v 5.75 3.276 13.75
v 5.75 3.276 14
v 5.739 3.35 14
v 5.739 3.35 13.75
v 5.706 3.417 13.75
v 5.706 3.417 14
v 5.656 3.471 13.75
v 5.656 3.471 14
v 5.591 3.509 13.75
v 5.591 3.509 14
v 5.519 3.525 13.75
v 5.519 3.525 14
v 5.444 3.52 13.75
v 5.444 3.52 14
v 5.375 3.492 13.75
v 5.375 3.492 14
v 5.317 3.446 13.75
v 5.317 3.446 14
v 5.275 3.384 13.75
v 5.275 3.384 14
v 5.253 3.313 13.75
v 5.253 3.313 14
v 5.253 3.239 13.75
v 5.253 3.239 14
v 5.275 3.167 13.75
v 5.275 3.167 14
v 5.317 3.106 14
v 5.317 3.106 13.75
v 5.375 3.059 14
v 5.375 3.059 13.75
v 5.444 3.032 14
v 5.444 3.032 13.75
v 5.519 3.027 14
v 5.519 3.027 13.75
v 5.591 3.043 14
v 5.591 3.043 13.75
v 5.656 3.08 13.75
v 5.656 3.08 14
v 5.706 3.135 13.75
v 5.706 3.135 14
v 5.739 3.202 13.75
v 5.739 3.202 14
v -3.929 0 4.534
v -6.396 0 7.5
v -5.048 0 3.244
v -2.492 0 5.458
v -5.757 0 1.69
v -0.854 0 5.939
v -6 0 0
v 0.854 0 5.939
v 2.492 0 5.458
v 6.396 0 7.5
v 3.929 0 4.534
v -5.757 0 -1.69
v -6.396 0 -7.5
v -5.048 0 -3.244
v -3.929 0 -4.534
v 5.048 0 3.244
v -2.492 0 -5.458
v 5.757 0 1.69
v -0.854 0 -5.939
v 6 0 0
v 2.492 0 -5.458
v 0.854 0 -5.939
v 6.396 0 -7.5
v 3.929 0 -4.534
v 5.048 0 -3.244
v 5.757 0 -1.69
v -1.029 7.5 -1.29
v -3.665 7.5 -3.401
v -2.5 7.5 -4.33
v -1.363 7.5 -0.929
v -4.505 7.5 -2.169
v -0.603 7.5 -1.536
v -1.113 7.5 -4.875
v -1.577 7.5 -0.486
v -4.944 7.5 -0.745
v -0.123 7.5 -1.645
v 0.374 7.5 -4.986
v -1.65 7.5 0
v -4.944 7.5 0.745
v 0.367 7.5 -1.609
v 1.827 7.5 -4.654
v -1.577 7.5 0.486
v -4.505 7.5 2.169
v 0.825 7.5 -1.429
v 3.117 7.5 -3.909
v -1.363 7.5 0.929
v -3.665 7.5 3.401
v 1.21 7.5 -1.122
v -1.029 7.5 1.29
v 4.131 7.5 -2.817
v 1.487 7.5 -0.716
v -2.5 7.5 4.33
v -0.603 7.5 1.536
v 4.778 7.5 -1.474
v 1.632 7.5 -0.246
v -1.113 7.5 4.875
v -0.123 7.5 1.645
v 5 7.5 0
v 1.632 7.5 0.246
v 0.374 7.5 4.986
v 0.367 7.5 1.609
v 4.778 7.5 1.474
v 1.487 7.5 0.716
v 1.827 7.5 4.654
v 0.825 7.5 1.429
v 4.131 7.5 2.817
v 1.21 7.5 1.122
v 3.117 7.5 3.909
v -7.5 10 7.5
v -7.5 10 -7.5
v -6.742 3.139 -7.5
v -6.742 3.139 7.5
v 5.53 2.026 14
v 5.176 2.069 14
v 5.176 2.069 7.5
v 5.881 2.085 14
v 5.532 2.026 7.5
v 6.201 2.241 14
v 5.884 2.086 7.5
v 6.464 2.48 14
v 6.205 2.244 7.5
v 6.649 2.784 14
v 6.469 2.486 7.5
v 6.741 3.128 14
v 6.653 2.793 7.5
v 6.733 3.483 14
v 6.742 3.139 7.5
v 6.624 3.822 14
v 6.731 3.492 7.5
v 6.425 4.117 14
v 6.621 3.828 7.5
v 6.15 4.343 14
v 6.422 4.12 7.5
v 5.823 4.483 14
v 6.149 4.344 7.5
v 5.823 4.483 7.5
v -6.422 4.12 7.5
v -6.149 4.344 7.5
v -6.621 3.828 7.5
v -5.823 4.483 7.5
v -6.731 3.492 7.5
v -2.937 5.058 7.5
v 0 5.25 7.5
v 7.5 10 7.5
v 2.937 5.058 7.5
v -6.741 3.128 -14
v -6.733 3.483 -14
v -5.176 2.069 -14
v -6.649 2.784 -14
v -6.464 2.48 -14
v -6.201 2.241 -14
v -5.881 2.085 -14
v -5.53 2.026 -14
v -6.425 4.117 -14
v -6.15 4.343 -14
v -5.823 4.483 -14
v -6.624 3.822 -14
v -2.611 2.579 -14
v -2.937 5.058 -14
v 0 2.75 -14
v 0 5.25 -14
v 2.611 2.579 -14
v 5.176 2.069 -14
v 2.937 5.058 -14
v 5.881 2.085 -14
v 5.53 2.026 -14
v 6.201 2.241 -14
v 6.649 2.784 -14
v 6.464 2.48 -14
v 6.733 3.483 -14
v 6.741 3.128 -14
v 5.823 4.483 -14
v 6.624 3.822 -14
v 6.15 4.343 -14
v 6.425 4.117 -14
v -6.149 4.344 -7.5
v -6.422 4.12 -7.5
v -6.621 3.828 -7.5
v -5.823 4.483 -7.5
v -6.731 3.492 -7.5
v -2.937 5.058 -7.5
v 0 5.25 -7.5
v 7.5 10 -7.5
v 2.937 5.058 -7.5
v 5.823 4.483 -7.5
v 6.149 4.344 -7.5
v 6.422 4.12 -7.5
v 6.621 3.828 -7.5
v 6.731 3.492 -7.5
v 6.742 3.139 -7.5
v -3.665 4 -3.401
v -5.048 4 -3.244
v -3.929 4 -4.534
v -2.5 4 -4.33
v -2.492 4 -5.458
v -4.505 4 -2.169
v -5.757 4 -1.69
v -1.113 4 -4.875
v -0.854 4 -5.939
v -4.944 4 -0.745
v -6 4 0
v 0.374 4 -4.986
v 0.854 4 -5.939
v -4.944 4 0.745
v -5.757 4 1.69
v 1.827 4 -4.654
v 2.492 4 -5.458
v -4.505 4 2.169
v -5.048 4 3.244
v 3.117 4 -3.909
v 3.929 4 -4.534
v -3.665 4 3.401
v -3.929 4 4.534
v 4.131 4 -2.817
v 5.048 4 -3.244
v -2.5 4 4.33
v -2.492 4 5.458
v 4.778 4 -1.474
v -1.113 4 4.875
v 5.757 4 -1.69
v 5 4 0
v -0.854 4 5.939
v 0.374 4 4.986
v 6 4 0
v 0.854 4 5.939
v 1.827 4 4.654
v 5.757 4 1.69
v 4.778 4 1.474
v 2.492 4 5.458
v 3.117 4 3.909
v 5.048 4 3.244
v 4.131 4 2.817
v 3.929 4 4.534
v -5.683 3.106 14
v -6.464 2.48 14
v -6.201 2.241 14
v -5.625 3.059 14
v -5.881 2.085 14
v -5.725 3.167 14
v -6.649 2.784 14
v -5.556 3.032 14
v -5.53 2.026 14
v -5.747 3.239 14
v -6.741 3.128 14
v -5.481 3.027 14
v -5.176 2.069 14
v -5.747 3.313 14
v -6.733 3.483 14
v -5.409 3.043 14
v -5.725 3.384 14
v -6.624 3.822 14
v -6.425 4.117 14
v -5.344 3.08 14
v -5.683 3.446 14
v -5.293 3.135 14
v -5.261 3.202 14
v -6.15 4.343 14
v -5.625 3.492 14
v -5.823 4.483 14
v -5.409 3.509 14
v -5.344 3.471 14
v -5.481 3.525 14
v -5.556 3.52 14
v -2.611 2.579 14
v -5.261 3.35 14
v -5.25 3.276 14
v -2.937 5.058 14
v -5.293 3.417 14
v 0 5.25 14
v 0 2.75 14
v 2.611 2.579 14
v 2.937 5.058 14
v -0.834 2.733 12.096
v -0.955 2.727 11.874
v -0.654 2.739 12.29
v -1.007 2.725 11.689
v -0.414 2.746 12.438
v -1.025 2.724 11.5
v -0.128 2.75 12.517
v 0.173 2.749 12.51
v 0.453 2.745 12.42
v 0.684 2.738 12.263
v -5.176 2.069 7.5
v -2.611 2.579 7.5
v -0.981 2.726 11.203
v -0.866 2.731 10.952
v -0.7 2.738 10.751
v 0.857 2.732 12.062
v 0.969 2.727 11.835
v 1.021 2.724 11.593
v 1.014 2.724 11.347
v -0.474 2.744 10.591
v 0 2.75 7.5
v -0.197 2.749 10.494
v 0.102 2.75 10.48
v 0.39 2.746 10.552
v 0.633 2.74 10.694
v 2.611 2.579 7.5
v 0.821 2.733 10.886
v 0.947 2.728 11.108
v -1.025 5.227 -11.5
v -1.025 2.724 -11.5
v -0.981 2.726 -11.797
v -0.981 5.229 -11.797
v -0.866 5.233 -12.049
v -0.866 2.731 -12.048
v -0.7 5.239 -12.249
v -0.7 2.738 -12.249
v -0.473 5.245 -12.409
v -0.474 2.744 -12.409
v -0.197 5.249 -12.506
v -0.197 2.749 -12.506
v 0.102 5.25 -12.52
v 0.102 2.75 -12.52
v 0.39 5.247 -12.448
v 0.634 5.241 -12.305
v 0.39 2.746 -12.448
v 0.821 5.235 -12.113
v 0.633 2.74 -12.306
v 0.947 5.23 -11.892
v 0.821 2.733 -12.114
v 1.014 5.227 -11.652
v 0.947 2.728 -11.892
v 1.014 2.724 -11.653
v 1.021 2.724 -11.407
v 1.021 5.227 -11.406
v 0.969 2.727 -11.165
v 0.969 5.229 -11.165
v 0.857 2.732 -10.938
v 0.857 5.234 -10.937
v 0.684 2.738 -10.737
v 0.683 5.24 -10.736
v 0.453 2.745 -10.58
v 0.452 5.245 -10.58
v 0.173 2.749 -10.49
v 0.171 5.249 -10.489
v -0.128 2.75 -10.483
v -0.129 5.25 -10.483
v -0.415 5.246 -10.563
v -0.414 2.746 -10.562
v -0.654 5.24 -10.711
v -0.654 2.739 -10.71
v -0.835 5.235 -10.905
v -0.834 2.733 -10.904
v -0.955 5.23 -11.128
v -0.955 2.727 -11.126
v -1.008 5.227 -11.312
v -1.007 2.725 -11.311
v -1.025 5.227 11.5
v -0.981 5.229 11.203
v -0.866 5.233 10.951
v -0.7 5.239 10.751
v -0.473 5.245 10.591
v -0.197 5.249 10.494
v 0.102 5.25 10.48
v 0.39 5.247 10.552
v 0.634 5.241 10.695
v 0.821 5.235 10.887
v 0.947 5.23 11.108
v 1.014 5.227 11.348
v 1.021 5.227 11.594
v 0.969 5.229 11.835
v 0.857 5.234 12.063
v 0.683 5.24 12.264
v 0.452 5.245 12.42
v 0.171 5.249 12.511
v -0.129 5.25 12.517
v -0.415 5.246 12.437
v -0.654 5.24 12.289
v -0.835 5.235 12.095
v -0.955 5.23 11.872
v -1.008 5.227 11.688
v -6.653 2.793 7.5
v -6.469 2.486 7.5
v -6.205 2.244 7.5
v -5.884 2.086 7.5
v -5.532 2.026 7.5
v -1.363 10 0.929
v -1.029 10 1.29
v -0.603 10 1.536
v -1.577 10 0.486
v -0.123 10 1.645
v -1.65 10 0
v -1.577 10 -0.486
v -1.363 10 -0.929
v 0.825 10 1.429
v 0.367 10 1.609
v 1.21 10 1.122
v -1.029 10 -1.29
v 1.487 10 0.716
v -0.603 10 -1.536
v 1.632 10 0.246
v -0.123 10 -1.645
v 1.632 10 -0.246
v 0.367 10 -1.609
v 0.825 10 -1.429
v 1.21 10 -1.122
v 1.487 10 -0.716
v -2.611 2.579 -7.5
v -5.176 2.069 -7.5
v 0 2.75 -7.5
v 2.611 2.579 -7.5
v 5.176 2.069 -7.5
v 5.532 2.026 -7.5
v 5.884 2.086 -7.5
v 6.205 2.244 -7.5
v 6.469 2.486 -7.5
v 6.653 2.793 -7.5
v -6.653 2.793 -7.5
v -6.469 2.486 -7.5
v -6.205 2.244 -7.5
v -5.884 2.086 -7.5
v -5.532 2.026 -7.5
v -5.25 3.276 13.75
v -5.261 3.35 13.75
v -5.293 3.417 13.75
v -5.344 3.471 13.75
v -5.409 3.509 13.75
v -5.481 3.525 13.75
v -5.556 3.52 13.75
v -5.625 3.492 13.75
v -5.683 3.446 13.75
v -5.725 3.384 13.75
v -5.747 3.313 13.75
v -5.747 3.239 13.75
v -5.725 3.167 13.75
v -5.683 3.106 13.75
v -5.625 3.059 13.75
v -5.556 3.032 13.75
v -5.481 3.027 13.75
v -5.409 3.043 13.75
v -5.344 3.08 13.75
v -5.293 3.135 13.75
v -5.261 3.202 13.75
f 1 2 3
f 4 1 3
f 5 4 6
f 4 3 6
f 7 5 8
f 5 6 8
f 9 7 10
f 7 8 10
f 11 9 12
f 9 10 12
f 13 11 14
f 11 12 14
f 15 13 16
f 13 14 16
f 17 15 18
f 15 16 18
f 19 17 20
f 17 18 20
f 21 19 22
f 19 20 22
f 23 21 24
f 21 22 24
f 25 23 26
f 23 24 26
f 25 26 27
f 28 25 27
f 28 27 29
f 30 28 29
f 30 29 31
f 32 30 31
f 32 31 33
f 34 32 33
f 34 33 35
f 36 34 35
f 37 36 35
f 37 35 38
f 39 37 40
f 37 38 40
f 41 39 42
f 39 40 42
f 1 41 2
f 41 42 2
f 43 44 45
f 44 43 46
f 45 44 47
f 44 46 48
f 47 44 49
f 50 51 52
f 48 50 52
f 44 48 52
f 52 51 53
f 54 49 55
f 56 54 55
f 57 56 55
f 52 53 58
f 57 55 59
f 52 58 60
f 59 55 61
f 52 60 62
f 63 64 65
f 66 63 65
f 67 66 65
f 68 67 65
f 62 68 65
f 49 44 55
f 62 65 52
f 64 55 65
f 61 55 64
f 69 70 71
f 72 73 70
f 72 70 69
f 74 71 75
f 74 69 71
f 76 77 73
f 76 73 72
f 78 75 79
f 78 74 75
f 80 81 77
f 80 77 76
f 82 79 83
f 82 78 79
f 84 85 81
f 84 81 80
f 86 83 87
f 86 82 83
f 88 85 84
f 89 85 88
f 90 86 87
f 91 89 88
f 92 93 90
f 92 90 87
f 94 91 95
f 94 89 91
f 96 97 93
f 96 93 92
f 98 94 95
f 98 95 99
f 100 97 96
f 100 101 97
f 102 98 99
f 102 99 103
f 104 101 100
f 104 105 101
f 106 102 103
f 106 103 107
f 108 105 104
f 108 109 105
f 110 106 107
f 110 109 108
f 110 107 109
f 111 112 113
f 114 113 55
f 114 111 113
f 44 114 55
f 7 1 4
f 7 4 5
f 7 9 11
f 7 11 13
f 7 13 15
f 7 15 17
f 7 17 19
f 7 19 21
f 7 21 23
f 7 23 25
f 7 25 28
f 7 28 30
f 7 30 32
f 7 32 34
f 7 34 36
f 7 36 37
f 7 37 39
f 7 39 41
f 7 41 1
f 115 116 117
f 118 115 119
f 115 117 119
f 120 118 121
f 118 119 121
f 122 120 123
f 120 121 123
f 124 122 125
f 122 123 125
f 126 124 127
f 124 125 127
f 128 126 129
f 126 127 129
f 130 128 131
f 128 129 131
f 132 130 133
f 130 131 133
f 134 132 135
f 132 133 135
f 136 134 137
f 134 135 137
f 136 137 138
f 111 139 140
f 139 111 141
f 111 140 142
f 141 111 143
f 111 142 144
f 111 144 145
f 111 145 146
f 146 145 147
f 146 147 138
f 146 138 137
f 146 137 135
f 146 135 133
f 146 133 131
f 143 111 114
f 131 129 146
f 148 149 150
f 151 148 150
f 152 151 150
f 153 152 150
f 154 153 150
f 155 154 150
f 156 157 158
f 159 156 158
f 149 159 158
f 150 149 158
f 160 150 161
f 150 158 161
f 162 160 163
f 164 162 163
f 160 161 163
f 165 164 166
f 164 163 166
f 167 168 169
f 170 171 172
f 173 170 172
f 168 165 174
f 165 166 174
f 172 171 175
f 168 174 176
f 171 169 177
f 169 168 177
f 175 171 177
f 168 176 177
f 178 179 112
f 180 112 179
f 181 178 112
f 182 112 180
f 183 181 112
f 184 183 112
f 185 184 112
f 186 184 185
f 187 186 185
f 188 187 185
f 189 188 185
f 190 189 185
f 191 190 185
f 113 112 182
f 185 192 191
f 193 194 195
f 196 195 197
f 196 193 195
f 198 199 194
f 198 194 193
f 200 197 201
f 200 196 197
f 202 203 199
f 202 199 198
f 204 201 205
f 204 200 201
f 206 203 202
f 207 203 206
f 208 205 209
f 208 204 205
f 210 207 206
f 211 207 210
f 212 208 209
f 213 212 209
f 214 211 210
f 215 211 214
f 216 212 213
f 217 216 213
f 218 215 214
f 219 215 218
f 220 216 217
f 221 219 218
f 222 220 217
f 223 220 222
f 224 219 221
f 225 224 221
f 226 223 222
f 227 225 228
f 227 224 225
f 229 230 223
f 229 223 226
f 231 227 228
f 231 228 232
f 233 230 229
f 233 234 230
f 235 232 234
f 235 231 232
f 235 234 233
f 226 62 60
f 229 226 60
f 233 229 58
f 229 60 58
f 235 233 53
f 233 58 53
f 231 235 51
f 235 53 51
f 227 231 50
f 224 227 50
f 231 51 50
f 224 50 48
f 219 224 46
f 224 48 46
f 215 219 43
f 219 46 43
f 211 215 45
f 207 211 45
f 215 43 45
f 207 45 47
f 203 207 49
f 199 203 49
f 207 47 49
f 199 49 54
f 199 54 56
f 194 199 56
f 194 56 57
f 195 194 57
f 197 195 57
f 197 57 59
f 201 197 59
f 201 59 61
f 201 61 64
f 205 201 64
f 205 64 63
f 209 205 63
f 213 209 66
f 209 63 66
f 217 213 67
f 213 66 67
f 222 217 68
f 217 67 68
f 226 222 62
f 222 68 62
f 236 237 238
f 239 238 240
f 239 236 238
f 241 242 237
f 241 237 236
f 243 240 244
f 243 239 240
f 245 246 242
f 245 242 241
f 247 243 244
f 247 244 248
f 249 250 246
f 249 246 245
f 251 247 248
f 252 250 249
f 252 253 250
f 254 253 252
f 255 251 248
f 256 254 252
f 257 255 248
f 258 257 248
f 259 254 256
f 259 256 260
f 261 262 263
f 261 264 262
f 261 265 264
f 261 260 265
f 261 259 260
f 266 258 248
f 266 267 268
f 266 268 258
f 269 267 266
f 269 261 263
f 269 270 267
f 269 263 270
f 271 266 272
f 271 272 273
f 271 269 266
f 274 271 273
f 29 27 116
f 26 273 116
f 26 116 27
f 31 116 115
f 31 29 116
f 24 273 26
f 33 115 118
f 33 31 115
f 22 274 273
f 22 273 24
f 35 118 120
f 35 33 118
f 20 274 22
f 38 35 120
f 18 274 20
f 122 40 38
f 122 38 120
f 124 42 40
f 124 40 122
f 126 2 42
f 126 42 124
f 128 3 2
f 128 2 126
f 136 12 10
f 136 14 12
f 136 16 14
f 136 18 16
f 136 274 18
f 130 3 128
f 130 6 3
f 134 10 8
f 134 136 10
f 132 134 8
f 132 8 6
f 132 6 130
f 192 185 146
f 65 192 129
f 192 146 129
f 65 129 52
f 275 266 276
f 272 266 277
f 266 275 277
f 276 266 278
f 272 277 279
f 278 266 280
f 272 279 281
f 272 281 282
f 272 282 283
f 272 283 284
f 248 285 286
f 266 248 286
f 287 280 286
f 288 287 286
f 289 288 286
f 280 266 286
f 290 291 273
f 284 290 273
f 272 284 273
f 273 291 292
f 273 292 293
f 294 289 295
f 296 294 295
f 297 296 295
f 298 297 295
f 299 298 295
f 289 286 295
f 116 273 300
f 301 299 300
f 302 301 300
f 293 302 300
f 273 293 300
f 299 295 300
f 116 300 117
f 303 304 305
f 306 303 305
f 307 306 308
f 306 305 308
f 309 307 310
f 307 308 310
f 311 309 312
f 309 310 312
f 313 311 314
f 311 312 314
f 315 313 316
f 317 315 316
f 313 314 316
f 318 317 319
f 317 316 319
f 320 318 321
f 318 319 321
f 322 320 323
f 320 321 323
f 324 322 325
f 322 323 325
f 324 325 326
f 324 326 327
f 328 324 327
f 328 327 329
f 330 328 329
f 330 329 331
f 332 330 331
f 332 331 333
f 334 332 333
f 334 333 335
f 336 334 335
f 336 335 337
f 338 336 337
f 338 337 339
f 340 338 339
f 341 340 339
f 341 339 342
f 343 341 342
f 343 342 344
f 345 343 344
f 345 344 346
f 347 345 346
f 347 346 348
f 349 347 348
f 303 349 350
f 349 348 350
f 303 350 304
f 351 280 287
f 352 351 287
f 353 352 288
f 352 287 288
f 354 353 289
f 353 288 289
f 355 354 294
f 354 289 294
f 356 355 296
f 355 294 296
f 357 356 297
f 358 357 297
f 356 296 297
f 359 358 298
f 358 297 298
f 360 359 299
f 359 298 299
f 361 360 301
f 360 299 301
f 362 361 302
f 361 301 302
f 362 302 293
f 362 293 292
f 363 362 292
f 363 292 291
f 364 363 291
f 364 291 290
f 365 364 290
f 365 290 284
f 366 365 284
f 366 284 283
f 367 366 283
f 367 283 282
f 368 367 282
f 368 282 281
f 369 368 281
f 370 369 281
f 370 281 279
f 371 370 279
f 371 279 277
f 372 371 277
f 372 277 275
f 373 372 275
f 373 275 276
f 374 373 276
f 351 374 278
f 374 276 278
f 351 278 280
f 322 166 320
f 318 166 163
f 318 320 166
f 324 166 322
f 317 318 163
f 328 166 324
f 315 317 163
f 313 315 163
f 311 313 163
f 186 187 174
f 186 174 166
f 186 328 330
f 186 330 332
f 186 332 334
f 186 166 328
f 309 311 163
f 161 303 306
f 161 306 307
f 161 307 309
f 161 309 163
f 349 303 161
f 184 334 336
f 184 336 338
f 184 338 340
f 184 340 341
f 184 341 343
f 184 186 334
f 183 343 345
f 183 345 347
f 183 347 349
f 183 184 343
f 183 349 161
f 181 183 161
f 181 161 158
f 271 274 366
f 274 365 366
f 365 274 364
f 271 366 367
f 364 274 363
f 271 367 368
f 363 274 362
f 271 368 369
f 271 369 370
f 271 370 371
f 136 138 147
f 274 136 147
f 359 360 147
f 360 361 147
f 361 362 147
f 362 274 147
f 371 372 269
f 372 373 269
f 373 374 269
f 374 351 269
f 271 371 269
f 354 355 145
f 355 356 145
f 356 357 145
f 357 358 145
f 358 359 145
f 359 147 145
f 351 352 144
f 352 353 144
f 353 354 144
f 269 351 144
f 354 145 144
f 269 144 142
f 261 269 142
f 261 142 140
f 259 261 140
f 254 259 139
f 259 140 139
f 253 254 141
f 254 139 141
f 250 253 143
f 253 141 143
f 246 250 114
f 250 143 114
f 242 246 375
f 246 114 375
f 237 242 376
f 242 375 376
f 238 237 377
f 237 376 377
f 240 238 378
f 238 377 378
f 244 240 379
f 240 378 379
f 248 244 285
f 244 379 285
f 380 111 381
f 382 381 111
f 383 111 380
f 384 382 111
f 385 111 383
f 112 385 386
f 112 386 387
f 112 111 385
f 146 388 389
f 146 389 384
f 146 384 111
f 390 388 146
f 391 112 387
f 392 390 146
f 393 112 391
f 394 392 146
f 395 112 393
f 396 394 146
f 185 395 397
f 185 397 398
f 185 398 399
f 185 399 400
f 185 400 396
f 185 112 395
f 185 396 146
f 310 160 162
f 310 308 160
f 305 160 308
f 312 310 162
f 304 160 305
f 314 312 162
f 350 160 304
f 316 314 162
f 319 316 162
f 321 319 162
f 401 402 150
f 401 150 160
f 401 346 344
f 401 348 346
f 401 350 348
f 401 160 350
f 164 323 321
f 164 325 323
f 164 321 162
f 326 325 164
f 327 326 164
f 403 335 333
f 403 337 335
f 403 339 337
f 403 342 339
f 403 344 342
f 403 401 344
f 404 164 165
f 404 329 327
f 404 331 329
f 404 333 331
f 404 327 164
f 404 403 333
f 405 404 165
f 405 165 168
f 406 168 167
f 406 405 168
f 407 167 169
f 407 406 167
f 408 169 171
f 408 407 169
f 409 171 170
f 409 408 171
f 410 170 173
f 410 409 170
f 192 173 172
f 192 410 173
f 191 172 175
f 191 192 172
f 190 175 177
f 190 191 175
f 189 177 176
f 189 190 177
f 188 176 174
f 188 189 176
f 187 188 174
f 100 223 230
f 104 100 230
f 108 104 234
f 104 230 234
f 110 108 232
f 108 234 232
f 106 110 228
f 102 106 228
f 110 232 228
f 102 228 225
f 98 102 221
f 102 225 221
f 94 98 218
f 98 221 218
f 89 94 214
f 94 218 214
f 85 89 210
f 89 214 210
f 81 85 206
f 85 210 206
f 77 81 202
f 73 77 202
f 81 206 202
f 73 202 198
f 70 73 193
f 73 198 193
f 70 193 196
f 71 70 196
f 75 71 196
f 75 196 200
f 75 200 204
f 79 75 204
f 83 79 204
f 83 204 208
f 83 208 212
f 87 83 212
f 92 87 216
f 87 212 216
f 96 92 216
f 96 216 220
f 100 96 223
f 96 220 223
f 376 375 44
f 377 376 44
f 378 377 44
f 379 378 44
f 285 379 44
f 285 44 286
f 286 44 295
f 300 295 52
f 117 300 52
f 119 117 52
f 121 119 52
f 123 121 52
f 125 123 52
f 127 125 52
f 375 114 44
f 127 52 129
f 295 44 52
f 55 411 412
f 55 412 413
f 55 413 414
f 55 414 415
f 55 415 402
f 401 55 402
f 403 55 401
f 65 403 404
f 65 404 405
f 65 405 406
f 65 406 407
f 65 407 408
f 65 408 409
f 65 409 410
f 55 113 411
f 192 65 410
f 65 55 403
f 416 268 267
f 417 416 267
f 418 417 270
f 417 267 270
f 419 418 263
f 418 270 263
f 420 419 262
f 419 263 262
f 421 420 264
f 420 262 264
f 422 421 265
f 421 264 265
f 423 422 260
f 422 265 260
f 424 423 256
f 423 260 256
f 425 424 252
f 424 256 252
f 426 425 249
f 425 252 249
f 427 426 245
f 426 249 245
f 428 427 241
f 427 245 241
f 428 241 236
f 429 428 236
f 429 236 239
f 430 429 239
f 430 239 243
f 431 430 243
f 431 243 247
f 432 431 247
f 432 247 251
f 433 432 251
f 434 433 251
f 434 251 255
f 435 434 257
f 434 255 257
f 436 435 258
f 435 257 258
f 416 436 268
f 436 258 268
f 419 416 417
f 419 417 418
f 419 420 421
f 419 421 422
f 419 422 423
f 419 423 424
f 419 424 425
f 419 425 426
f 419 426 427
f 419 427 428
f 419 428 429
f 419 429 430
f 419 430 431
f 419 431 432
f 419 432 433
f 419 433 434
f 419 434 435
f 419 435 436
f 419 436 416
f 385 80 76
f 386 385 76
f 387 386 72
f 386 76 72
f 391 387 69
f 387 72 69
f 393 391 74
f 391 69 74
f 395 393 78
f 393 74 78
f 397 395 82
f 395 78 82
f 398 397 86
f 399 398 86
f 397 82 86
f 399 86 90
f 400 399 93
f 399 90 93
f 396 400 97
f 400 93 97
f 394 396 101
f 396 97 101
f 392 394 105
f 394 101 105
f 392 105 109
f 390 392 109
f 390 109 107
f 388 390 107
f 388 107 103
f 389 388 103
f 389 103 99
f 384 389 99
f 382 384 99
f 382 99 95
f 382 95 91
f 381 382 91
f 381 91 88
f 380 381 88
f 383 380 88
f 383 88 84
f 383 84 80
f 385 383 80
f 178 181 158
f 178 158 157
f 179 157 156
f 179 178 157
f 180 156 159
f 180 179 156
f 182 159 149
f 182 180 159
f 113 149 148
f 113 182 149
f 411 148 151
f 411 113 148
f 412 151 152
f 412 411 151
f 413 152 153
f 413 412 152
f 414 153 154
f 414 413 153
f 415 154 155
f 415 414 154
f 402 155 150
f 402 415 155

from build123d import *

# Parameters (mm, degrees)
SKETCH1_W             = 15
SKETCH1_H             = 15
BOSS_EXTRUDE1_DEPTH   = 10
SKETCH2_R             = 6
CUT_EXTRUDE1_DEPTH    = 4
SKETCH3_R             = 5
CUT_EXTRUDE2_DEPTH    = 3.5
BOSS_EXTRUDE2_DEPTH   = 6.5
M4_TAPPED_HOLE1_D     = 3.3
M4_TAPPED_HOLE1_DEPTH = 2.5
M2_5_TAPPED_HOLE1_D   = 2.05
SKETCH10_R            = 0.25
CUT_EXTRUDE3_DEPTH    = 0.25
CUT_EXTRUDE4_REACH    = 23.5


with BuildPart() as part:
    # Sketch1 → Boss-Extrude1 (new body)
    with BuildSketch(Plane(origin=(0, 0, 0), x_dir=(1, 0, 0), z_dir=(0, 1, 0))):
        Rectangle(SKETCH1_W, SKETCH1_H)
    extrude(amount=BOSS_EXTRUDE1_DEPTH)

    # Sketch2 → Cut-Extrude1 (cut)
    with BuildSketch(Plane.XZ):
        Circle(SKETCH2_R)
    extrude(amount=-CUT_EXTRUDE1_DEPTH, mode=Mode.SUBTRACT)

    # Sketch3 → Cut-Extrude2 (cut)
    with BuildSketch(Plane.XZ.offset(-4)):
        Circle(SKETCH3_R)
    extrude(amount=-CUT_EXTRUDE2_DEPTH, mode=Mode.SUBTRACT)

    # Sketch4 → Boss-Extrude2 (add)
    with BuildSketch(Plane.XY.offset(7.5)):
        with BuildLine():
            ThreePointArc((5.823428515, 4.483331092), (0, 5.25), (-5.823428515, 4.483331092))
            ThreePointArc((-5.823428515, 4.483331092), (-6.707311991, 2.952400002), (-5.176380902, 2.068516526))
            ThreePointArc((-5.176380902, 2.068516526), (0, 2.75), (5.176380902, 2.068516526))
            ThreePointArc((5.176380902, 2.068516526), (6.707311991, 2.952400002), (5.823428515, 4.483331092))
        make_face()
    boss_extrude2 = extrude(amount=BOSS_EXTRUDE2_DEPTH)

    # Mirror1: Boss-Extrude2 across plane
    add(boss_extrude2.mirror(Plane.XY))

    # M4 Tapped Hole1
    with Locations(Plane(origin=(0, 10, 0), x_dir=(1, 0, 0), z_dir=(0, 1, 0))):
        with Locations((0, 0)):
            Hole(M4_TAPPED_HOLE1_D / 2, depth=M4_TAPPED_HOLE1_DEPTH)

    # M2.5 Tapped Hole1 (through all)
    with Locations(Plane(origin=(0, 10, 0), x_dir=(1, 0, 0), z_dir=(0, 1, 0))):
        with Locations((0, 11.5), (0, -11.5)):
            Hole(M2_5_TAPPED_HOLE1_D / 2)

    # Sketch10 → Cut-Extrude3 (cut)
    with BuildSketch(Plane.XY.offset(14)):
        with Locations((-5.499904708, 3.275923809)):
            Circle(SKETCH10_R)
        with Locations((5.499904708, 3.275923809)):
            Circle(SKETCH10_R)
    extrude(amount=-CUT_EXTRUDE3_DEPTH, mode=Mode.SUBTRACT)

    # Sketch11 → Cut-Extrude4 (cut, up to next)
    with BuildSketch(Plane.XY.offset(7.5), mode=Mode.PRIVATE) as cut_extrude4_sk1:
        Polygon((-7.5, 10), (-6.395762797, 0), (-7.5, 0), align=None)
    cut_extrude4_tool1 = extrude(cut_extrude4_sk1.sketch, amount=-CUT_EXTRUDE4_REACH, mode=Mode.PRIVATE) & part.part
    add(cut_extrude4_tool1.solids().sort_by_distance((-7.131921, 3.333333, 7.5))[0], mode=Mode.SUBTRACT)
    # Sketch11 → Cut-Extrude4 (cut, up to next)
    with BuildSketch(Plane.XY.offset(7.5), mode=Mode.PRIVATE) as cut_extrude4_sk2:
        Polygon((7.5, 10), (6.395762797, 0), (7.5, 0), align=None)
    cut_extrude4_tool2 = extrude(cut_extrude4_sk2.sketch, amount=-CUT_EXTRUDE4_REACH, mode=Mode.PRIVATE) & part.part
    add(cut_extrude4_tool2.solids().sort_by_distance((7.131921, 3.333333, 7.5))[0], mode=Mode.SUBTRACT)


solid = part.part
